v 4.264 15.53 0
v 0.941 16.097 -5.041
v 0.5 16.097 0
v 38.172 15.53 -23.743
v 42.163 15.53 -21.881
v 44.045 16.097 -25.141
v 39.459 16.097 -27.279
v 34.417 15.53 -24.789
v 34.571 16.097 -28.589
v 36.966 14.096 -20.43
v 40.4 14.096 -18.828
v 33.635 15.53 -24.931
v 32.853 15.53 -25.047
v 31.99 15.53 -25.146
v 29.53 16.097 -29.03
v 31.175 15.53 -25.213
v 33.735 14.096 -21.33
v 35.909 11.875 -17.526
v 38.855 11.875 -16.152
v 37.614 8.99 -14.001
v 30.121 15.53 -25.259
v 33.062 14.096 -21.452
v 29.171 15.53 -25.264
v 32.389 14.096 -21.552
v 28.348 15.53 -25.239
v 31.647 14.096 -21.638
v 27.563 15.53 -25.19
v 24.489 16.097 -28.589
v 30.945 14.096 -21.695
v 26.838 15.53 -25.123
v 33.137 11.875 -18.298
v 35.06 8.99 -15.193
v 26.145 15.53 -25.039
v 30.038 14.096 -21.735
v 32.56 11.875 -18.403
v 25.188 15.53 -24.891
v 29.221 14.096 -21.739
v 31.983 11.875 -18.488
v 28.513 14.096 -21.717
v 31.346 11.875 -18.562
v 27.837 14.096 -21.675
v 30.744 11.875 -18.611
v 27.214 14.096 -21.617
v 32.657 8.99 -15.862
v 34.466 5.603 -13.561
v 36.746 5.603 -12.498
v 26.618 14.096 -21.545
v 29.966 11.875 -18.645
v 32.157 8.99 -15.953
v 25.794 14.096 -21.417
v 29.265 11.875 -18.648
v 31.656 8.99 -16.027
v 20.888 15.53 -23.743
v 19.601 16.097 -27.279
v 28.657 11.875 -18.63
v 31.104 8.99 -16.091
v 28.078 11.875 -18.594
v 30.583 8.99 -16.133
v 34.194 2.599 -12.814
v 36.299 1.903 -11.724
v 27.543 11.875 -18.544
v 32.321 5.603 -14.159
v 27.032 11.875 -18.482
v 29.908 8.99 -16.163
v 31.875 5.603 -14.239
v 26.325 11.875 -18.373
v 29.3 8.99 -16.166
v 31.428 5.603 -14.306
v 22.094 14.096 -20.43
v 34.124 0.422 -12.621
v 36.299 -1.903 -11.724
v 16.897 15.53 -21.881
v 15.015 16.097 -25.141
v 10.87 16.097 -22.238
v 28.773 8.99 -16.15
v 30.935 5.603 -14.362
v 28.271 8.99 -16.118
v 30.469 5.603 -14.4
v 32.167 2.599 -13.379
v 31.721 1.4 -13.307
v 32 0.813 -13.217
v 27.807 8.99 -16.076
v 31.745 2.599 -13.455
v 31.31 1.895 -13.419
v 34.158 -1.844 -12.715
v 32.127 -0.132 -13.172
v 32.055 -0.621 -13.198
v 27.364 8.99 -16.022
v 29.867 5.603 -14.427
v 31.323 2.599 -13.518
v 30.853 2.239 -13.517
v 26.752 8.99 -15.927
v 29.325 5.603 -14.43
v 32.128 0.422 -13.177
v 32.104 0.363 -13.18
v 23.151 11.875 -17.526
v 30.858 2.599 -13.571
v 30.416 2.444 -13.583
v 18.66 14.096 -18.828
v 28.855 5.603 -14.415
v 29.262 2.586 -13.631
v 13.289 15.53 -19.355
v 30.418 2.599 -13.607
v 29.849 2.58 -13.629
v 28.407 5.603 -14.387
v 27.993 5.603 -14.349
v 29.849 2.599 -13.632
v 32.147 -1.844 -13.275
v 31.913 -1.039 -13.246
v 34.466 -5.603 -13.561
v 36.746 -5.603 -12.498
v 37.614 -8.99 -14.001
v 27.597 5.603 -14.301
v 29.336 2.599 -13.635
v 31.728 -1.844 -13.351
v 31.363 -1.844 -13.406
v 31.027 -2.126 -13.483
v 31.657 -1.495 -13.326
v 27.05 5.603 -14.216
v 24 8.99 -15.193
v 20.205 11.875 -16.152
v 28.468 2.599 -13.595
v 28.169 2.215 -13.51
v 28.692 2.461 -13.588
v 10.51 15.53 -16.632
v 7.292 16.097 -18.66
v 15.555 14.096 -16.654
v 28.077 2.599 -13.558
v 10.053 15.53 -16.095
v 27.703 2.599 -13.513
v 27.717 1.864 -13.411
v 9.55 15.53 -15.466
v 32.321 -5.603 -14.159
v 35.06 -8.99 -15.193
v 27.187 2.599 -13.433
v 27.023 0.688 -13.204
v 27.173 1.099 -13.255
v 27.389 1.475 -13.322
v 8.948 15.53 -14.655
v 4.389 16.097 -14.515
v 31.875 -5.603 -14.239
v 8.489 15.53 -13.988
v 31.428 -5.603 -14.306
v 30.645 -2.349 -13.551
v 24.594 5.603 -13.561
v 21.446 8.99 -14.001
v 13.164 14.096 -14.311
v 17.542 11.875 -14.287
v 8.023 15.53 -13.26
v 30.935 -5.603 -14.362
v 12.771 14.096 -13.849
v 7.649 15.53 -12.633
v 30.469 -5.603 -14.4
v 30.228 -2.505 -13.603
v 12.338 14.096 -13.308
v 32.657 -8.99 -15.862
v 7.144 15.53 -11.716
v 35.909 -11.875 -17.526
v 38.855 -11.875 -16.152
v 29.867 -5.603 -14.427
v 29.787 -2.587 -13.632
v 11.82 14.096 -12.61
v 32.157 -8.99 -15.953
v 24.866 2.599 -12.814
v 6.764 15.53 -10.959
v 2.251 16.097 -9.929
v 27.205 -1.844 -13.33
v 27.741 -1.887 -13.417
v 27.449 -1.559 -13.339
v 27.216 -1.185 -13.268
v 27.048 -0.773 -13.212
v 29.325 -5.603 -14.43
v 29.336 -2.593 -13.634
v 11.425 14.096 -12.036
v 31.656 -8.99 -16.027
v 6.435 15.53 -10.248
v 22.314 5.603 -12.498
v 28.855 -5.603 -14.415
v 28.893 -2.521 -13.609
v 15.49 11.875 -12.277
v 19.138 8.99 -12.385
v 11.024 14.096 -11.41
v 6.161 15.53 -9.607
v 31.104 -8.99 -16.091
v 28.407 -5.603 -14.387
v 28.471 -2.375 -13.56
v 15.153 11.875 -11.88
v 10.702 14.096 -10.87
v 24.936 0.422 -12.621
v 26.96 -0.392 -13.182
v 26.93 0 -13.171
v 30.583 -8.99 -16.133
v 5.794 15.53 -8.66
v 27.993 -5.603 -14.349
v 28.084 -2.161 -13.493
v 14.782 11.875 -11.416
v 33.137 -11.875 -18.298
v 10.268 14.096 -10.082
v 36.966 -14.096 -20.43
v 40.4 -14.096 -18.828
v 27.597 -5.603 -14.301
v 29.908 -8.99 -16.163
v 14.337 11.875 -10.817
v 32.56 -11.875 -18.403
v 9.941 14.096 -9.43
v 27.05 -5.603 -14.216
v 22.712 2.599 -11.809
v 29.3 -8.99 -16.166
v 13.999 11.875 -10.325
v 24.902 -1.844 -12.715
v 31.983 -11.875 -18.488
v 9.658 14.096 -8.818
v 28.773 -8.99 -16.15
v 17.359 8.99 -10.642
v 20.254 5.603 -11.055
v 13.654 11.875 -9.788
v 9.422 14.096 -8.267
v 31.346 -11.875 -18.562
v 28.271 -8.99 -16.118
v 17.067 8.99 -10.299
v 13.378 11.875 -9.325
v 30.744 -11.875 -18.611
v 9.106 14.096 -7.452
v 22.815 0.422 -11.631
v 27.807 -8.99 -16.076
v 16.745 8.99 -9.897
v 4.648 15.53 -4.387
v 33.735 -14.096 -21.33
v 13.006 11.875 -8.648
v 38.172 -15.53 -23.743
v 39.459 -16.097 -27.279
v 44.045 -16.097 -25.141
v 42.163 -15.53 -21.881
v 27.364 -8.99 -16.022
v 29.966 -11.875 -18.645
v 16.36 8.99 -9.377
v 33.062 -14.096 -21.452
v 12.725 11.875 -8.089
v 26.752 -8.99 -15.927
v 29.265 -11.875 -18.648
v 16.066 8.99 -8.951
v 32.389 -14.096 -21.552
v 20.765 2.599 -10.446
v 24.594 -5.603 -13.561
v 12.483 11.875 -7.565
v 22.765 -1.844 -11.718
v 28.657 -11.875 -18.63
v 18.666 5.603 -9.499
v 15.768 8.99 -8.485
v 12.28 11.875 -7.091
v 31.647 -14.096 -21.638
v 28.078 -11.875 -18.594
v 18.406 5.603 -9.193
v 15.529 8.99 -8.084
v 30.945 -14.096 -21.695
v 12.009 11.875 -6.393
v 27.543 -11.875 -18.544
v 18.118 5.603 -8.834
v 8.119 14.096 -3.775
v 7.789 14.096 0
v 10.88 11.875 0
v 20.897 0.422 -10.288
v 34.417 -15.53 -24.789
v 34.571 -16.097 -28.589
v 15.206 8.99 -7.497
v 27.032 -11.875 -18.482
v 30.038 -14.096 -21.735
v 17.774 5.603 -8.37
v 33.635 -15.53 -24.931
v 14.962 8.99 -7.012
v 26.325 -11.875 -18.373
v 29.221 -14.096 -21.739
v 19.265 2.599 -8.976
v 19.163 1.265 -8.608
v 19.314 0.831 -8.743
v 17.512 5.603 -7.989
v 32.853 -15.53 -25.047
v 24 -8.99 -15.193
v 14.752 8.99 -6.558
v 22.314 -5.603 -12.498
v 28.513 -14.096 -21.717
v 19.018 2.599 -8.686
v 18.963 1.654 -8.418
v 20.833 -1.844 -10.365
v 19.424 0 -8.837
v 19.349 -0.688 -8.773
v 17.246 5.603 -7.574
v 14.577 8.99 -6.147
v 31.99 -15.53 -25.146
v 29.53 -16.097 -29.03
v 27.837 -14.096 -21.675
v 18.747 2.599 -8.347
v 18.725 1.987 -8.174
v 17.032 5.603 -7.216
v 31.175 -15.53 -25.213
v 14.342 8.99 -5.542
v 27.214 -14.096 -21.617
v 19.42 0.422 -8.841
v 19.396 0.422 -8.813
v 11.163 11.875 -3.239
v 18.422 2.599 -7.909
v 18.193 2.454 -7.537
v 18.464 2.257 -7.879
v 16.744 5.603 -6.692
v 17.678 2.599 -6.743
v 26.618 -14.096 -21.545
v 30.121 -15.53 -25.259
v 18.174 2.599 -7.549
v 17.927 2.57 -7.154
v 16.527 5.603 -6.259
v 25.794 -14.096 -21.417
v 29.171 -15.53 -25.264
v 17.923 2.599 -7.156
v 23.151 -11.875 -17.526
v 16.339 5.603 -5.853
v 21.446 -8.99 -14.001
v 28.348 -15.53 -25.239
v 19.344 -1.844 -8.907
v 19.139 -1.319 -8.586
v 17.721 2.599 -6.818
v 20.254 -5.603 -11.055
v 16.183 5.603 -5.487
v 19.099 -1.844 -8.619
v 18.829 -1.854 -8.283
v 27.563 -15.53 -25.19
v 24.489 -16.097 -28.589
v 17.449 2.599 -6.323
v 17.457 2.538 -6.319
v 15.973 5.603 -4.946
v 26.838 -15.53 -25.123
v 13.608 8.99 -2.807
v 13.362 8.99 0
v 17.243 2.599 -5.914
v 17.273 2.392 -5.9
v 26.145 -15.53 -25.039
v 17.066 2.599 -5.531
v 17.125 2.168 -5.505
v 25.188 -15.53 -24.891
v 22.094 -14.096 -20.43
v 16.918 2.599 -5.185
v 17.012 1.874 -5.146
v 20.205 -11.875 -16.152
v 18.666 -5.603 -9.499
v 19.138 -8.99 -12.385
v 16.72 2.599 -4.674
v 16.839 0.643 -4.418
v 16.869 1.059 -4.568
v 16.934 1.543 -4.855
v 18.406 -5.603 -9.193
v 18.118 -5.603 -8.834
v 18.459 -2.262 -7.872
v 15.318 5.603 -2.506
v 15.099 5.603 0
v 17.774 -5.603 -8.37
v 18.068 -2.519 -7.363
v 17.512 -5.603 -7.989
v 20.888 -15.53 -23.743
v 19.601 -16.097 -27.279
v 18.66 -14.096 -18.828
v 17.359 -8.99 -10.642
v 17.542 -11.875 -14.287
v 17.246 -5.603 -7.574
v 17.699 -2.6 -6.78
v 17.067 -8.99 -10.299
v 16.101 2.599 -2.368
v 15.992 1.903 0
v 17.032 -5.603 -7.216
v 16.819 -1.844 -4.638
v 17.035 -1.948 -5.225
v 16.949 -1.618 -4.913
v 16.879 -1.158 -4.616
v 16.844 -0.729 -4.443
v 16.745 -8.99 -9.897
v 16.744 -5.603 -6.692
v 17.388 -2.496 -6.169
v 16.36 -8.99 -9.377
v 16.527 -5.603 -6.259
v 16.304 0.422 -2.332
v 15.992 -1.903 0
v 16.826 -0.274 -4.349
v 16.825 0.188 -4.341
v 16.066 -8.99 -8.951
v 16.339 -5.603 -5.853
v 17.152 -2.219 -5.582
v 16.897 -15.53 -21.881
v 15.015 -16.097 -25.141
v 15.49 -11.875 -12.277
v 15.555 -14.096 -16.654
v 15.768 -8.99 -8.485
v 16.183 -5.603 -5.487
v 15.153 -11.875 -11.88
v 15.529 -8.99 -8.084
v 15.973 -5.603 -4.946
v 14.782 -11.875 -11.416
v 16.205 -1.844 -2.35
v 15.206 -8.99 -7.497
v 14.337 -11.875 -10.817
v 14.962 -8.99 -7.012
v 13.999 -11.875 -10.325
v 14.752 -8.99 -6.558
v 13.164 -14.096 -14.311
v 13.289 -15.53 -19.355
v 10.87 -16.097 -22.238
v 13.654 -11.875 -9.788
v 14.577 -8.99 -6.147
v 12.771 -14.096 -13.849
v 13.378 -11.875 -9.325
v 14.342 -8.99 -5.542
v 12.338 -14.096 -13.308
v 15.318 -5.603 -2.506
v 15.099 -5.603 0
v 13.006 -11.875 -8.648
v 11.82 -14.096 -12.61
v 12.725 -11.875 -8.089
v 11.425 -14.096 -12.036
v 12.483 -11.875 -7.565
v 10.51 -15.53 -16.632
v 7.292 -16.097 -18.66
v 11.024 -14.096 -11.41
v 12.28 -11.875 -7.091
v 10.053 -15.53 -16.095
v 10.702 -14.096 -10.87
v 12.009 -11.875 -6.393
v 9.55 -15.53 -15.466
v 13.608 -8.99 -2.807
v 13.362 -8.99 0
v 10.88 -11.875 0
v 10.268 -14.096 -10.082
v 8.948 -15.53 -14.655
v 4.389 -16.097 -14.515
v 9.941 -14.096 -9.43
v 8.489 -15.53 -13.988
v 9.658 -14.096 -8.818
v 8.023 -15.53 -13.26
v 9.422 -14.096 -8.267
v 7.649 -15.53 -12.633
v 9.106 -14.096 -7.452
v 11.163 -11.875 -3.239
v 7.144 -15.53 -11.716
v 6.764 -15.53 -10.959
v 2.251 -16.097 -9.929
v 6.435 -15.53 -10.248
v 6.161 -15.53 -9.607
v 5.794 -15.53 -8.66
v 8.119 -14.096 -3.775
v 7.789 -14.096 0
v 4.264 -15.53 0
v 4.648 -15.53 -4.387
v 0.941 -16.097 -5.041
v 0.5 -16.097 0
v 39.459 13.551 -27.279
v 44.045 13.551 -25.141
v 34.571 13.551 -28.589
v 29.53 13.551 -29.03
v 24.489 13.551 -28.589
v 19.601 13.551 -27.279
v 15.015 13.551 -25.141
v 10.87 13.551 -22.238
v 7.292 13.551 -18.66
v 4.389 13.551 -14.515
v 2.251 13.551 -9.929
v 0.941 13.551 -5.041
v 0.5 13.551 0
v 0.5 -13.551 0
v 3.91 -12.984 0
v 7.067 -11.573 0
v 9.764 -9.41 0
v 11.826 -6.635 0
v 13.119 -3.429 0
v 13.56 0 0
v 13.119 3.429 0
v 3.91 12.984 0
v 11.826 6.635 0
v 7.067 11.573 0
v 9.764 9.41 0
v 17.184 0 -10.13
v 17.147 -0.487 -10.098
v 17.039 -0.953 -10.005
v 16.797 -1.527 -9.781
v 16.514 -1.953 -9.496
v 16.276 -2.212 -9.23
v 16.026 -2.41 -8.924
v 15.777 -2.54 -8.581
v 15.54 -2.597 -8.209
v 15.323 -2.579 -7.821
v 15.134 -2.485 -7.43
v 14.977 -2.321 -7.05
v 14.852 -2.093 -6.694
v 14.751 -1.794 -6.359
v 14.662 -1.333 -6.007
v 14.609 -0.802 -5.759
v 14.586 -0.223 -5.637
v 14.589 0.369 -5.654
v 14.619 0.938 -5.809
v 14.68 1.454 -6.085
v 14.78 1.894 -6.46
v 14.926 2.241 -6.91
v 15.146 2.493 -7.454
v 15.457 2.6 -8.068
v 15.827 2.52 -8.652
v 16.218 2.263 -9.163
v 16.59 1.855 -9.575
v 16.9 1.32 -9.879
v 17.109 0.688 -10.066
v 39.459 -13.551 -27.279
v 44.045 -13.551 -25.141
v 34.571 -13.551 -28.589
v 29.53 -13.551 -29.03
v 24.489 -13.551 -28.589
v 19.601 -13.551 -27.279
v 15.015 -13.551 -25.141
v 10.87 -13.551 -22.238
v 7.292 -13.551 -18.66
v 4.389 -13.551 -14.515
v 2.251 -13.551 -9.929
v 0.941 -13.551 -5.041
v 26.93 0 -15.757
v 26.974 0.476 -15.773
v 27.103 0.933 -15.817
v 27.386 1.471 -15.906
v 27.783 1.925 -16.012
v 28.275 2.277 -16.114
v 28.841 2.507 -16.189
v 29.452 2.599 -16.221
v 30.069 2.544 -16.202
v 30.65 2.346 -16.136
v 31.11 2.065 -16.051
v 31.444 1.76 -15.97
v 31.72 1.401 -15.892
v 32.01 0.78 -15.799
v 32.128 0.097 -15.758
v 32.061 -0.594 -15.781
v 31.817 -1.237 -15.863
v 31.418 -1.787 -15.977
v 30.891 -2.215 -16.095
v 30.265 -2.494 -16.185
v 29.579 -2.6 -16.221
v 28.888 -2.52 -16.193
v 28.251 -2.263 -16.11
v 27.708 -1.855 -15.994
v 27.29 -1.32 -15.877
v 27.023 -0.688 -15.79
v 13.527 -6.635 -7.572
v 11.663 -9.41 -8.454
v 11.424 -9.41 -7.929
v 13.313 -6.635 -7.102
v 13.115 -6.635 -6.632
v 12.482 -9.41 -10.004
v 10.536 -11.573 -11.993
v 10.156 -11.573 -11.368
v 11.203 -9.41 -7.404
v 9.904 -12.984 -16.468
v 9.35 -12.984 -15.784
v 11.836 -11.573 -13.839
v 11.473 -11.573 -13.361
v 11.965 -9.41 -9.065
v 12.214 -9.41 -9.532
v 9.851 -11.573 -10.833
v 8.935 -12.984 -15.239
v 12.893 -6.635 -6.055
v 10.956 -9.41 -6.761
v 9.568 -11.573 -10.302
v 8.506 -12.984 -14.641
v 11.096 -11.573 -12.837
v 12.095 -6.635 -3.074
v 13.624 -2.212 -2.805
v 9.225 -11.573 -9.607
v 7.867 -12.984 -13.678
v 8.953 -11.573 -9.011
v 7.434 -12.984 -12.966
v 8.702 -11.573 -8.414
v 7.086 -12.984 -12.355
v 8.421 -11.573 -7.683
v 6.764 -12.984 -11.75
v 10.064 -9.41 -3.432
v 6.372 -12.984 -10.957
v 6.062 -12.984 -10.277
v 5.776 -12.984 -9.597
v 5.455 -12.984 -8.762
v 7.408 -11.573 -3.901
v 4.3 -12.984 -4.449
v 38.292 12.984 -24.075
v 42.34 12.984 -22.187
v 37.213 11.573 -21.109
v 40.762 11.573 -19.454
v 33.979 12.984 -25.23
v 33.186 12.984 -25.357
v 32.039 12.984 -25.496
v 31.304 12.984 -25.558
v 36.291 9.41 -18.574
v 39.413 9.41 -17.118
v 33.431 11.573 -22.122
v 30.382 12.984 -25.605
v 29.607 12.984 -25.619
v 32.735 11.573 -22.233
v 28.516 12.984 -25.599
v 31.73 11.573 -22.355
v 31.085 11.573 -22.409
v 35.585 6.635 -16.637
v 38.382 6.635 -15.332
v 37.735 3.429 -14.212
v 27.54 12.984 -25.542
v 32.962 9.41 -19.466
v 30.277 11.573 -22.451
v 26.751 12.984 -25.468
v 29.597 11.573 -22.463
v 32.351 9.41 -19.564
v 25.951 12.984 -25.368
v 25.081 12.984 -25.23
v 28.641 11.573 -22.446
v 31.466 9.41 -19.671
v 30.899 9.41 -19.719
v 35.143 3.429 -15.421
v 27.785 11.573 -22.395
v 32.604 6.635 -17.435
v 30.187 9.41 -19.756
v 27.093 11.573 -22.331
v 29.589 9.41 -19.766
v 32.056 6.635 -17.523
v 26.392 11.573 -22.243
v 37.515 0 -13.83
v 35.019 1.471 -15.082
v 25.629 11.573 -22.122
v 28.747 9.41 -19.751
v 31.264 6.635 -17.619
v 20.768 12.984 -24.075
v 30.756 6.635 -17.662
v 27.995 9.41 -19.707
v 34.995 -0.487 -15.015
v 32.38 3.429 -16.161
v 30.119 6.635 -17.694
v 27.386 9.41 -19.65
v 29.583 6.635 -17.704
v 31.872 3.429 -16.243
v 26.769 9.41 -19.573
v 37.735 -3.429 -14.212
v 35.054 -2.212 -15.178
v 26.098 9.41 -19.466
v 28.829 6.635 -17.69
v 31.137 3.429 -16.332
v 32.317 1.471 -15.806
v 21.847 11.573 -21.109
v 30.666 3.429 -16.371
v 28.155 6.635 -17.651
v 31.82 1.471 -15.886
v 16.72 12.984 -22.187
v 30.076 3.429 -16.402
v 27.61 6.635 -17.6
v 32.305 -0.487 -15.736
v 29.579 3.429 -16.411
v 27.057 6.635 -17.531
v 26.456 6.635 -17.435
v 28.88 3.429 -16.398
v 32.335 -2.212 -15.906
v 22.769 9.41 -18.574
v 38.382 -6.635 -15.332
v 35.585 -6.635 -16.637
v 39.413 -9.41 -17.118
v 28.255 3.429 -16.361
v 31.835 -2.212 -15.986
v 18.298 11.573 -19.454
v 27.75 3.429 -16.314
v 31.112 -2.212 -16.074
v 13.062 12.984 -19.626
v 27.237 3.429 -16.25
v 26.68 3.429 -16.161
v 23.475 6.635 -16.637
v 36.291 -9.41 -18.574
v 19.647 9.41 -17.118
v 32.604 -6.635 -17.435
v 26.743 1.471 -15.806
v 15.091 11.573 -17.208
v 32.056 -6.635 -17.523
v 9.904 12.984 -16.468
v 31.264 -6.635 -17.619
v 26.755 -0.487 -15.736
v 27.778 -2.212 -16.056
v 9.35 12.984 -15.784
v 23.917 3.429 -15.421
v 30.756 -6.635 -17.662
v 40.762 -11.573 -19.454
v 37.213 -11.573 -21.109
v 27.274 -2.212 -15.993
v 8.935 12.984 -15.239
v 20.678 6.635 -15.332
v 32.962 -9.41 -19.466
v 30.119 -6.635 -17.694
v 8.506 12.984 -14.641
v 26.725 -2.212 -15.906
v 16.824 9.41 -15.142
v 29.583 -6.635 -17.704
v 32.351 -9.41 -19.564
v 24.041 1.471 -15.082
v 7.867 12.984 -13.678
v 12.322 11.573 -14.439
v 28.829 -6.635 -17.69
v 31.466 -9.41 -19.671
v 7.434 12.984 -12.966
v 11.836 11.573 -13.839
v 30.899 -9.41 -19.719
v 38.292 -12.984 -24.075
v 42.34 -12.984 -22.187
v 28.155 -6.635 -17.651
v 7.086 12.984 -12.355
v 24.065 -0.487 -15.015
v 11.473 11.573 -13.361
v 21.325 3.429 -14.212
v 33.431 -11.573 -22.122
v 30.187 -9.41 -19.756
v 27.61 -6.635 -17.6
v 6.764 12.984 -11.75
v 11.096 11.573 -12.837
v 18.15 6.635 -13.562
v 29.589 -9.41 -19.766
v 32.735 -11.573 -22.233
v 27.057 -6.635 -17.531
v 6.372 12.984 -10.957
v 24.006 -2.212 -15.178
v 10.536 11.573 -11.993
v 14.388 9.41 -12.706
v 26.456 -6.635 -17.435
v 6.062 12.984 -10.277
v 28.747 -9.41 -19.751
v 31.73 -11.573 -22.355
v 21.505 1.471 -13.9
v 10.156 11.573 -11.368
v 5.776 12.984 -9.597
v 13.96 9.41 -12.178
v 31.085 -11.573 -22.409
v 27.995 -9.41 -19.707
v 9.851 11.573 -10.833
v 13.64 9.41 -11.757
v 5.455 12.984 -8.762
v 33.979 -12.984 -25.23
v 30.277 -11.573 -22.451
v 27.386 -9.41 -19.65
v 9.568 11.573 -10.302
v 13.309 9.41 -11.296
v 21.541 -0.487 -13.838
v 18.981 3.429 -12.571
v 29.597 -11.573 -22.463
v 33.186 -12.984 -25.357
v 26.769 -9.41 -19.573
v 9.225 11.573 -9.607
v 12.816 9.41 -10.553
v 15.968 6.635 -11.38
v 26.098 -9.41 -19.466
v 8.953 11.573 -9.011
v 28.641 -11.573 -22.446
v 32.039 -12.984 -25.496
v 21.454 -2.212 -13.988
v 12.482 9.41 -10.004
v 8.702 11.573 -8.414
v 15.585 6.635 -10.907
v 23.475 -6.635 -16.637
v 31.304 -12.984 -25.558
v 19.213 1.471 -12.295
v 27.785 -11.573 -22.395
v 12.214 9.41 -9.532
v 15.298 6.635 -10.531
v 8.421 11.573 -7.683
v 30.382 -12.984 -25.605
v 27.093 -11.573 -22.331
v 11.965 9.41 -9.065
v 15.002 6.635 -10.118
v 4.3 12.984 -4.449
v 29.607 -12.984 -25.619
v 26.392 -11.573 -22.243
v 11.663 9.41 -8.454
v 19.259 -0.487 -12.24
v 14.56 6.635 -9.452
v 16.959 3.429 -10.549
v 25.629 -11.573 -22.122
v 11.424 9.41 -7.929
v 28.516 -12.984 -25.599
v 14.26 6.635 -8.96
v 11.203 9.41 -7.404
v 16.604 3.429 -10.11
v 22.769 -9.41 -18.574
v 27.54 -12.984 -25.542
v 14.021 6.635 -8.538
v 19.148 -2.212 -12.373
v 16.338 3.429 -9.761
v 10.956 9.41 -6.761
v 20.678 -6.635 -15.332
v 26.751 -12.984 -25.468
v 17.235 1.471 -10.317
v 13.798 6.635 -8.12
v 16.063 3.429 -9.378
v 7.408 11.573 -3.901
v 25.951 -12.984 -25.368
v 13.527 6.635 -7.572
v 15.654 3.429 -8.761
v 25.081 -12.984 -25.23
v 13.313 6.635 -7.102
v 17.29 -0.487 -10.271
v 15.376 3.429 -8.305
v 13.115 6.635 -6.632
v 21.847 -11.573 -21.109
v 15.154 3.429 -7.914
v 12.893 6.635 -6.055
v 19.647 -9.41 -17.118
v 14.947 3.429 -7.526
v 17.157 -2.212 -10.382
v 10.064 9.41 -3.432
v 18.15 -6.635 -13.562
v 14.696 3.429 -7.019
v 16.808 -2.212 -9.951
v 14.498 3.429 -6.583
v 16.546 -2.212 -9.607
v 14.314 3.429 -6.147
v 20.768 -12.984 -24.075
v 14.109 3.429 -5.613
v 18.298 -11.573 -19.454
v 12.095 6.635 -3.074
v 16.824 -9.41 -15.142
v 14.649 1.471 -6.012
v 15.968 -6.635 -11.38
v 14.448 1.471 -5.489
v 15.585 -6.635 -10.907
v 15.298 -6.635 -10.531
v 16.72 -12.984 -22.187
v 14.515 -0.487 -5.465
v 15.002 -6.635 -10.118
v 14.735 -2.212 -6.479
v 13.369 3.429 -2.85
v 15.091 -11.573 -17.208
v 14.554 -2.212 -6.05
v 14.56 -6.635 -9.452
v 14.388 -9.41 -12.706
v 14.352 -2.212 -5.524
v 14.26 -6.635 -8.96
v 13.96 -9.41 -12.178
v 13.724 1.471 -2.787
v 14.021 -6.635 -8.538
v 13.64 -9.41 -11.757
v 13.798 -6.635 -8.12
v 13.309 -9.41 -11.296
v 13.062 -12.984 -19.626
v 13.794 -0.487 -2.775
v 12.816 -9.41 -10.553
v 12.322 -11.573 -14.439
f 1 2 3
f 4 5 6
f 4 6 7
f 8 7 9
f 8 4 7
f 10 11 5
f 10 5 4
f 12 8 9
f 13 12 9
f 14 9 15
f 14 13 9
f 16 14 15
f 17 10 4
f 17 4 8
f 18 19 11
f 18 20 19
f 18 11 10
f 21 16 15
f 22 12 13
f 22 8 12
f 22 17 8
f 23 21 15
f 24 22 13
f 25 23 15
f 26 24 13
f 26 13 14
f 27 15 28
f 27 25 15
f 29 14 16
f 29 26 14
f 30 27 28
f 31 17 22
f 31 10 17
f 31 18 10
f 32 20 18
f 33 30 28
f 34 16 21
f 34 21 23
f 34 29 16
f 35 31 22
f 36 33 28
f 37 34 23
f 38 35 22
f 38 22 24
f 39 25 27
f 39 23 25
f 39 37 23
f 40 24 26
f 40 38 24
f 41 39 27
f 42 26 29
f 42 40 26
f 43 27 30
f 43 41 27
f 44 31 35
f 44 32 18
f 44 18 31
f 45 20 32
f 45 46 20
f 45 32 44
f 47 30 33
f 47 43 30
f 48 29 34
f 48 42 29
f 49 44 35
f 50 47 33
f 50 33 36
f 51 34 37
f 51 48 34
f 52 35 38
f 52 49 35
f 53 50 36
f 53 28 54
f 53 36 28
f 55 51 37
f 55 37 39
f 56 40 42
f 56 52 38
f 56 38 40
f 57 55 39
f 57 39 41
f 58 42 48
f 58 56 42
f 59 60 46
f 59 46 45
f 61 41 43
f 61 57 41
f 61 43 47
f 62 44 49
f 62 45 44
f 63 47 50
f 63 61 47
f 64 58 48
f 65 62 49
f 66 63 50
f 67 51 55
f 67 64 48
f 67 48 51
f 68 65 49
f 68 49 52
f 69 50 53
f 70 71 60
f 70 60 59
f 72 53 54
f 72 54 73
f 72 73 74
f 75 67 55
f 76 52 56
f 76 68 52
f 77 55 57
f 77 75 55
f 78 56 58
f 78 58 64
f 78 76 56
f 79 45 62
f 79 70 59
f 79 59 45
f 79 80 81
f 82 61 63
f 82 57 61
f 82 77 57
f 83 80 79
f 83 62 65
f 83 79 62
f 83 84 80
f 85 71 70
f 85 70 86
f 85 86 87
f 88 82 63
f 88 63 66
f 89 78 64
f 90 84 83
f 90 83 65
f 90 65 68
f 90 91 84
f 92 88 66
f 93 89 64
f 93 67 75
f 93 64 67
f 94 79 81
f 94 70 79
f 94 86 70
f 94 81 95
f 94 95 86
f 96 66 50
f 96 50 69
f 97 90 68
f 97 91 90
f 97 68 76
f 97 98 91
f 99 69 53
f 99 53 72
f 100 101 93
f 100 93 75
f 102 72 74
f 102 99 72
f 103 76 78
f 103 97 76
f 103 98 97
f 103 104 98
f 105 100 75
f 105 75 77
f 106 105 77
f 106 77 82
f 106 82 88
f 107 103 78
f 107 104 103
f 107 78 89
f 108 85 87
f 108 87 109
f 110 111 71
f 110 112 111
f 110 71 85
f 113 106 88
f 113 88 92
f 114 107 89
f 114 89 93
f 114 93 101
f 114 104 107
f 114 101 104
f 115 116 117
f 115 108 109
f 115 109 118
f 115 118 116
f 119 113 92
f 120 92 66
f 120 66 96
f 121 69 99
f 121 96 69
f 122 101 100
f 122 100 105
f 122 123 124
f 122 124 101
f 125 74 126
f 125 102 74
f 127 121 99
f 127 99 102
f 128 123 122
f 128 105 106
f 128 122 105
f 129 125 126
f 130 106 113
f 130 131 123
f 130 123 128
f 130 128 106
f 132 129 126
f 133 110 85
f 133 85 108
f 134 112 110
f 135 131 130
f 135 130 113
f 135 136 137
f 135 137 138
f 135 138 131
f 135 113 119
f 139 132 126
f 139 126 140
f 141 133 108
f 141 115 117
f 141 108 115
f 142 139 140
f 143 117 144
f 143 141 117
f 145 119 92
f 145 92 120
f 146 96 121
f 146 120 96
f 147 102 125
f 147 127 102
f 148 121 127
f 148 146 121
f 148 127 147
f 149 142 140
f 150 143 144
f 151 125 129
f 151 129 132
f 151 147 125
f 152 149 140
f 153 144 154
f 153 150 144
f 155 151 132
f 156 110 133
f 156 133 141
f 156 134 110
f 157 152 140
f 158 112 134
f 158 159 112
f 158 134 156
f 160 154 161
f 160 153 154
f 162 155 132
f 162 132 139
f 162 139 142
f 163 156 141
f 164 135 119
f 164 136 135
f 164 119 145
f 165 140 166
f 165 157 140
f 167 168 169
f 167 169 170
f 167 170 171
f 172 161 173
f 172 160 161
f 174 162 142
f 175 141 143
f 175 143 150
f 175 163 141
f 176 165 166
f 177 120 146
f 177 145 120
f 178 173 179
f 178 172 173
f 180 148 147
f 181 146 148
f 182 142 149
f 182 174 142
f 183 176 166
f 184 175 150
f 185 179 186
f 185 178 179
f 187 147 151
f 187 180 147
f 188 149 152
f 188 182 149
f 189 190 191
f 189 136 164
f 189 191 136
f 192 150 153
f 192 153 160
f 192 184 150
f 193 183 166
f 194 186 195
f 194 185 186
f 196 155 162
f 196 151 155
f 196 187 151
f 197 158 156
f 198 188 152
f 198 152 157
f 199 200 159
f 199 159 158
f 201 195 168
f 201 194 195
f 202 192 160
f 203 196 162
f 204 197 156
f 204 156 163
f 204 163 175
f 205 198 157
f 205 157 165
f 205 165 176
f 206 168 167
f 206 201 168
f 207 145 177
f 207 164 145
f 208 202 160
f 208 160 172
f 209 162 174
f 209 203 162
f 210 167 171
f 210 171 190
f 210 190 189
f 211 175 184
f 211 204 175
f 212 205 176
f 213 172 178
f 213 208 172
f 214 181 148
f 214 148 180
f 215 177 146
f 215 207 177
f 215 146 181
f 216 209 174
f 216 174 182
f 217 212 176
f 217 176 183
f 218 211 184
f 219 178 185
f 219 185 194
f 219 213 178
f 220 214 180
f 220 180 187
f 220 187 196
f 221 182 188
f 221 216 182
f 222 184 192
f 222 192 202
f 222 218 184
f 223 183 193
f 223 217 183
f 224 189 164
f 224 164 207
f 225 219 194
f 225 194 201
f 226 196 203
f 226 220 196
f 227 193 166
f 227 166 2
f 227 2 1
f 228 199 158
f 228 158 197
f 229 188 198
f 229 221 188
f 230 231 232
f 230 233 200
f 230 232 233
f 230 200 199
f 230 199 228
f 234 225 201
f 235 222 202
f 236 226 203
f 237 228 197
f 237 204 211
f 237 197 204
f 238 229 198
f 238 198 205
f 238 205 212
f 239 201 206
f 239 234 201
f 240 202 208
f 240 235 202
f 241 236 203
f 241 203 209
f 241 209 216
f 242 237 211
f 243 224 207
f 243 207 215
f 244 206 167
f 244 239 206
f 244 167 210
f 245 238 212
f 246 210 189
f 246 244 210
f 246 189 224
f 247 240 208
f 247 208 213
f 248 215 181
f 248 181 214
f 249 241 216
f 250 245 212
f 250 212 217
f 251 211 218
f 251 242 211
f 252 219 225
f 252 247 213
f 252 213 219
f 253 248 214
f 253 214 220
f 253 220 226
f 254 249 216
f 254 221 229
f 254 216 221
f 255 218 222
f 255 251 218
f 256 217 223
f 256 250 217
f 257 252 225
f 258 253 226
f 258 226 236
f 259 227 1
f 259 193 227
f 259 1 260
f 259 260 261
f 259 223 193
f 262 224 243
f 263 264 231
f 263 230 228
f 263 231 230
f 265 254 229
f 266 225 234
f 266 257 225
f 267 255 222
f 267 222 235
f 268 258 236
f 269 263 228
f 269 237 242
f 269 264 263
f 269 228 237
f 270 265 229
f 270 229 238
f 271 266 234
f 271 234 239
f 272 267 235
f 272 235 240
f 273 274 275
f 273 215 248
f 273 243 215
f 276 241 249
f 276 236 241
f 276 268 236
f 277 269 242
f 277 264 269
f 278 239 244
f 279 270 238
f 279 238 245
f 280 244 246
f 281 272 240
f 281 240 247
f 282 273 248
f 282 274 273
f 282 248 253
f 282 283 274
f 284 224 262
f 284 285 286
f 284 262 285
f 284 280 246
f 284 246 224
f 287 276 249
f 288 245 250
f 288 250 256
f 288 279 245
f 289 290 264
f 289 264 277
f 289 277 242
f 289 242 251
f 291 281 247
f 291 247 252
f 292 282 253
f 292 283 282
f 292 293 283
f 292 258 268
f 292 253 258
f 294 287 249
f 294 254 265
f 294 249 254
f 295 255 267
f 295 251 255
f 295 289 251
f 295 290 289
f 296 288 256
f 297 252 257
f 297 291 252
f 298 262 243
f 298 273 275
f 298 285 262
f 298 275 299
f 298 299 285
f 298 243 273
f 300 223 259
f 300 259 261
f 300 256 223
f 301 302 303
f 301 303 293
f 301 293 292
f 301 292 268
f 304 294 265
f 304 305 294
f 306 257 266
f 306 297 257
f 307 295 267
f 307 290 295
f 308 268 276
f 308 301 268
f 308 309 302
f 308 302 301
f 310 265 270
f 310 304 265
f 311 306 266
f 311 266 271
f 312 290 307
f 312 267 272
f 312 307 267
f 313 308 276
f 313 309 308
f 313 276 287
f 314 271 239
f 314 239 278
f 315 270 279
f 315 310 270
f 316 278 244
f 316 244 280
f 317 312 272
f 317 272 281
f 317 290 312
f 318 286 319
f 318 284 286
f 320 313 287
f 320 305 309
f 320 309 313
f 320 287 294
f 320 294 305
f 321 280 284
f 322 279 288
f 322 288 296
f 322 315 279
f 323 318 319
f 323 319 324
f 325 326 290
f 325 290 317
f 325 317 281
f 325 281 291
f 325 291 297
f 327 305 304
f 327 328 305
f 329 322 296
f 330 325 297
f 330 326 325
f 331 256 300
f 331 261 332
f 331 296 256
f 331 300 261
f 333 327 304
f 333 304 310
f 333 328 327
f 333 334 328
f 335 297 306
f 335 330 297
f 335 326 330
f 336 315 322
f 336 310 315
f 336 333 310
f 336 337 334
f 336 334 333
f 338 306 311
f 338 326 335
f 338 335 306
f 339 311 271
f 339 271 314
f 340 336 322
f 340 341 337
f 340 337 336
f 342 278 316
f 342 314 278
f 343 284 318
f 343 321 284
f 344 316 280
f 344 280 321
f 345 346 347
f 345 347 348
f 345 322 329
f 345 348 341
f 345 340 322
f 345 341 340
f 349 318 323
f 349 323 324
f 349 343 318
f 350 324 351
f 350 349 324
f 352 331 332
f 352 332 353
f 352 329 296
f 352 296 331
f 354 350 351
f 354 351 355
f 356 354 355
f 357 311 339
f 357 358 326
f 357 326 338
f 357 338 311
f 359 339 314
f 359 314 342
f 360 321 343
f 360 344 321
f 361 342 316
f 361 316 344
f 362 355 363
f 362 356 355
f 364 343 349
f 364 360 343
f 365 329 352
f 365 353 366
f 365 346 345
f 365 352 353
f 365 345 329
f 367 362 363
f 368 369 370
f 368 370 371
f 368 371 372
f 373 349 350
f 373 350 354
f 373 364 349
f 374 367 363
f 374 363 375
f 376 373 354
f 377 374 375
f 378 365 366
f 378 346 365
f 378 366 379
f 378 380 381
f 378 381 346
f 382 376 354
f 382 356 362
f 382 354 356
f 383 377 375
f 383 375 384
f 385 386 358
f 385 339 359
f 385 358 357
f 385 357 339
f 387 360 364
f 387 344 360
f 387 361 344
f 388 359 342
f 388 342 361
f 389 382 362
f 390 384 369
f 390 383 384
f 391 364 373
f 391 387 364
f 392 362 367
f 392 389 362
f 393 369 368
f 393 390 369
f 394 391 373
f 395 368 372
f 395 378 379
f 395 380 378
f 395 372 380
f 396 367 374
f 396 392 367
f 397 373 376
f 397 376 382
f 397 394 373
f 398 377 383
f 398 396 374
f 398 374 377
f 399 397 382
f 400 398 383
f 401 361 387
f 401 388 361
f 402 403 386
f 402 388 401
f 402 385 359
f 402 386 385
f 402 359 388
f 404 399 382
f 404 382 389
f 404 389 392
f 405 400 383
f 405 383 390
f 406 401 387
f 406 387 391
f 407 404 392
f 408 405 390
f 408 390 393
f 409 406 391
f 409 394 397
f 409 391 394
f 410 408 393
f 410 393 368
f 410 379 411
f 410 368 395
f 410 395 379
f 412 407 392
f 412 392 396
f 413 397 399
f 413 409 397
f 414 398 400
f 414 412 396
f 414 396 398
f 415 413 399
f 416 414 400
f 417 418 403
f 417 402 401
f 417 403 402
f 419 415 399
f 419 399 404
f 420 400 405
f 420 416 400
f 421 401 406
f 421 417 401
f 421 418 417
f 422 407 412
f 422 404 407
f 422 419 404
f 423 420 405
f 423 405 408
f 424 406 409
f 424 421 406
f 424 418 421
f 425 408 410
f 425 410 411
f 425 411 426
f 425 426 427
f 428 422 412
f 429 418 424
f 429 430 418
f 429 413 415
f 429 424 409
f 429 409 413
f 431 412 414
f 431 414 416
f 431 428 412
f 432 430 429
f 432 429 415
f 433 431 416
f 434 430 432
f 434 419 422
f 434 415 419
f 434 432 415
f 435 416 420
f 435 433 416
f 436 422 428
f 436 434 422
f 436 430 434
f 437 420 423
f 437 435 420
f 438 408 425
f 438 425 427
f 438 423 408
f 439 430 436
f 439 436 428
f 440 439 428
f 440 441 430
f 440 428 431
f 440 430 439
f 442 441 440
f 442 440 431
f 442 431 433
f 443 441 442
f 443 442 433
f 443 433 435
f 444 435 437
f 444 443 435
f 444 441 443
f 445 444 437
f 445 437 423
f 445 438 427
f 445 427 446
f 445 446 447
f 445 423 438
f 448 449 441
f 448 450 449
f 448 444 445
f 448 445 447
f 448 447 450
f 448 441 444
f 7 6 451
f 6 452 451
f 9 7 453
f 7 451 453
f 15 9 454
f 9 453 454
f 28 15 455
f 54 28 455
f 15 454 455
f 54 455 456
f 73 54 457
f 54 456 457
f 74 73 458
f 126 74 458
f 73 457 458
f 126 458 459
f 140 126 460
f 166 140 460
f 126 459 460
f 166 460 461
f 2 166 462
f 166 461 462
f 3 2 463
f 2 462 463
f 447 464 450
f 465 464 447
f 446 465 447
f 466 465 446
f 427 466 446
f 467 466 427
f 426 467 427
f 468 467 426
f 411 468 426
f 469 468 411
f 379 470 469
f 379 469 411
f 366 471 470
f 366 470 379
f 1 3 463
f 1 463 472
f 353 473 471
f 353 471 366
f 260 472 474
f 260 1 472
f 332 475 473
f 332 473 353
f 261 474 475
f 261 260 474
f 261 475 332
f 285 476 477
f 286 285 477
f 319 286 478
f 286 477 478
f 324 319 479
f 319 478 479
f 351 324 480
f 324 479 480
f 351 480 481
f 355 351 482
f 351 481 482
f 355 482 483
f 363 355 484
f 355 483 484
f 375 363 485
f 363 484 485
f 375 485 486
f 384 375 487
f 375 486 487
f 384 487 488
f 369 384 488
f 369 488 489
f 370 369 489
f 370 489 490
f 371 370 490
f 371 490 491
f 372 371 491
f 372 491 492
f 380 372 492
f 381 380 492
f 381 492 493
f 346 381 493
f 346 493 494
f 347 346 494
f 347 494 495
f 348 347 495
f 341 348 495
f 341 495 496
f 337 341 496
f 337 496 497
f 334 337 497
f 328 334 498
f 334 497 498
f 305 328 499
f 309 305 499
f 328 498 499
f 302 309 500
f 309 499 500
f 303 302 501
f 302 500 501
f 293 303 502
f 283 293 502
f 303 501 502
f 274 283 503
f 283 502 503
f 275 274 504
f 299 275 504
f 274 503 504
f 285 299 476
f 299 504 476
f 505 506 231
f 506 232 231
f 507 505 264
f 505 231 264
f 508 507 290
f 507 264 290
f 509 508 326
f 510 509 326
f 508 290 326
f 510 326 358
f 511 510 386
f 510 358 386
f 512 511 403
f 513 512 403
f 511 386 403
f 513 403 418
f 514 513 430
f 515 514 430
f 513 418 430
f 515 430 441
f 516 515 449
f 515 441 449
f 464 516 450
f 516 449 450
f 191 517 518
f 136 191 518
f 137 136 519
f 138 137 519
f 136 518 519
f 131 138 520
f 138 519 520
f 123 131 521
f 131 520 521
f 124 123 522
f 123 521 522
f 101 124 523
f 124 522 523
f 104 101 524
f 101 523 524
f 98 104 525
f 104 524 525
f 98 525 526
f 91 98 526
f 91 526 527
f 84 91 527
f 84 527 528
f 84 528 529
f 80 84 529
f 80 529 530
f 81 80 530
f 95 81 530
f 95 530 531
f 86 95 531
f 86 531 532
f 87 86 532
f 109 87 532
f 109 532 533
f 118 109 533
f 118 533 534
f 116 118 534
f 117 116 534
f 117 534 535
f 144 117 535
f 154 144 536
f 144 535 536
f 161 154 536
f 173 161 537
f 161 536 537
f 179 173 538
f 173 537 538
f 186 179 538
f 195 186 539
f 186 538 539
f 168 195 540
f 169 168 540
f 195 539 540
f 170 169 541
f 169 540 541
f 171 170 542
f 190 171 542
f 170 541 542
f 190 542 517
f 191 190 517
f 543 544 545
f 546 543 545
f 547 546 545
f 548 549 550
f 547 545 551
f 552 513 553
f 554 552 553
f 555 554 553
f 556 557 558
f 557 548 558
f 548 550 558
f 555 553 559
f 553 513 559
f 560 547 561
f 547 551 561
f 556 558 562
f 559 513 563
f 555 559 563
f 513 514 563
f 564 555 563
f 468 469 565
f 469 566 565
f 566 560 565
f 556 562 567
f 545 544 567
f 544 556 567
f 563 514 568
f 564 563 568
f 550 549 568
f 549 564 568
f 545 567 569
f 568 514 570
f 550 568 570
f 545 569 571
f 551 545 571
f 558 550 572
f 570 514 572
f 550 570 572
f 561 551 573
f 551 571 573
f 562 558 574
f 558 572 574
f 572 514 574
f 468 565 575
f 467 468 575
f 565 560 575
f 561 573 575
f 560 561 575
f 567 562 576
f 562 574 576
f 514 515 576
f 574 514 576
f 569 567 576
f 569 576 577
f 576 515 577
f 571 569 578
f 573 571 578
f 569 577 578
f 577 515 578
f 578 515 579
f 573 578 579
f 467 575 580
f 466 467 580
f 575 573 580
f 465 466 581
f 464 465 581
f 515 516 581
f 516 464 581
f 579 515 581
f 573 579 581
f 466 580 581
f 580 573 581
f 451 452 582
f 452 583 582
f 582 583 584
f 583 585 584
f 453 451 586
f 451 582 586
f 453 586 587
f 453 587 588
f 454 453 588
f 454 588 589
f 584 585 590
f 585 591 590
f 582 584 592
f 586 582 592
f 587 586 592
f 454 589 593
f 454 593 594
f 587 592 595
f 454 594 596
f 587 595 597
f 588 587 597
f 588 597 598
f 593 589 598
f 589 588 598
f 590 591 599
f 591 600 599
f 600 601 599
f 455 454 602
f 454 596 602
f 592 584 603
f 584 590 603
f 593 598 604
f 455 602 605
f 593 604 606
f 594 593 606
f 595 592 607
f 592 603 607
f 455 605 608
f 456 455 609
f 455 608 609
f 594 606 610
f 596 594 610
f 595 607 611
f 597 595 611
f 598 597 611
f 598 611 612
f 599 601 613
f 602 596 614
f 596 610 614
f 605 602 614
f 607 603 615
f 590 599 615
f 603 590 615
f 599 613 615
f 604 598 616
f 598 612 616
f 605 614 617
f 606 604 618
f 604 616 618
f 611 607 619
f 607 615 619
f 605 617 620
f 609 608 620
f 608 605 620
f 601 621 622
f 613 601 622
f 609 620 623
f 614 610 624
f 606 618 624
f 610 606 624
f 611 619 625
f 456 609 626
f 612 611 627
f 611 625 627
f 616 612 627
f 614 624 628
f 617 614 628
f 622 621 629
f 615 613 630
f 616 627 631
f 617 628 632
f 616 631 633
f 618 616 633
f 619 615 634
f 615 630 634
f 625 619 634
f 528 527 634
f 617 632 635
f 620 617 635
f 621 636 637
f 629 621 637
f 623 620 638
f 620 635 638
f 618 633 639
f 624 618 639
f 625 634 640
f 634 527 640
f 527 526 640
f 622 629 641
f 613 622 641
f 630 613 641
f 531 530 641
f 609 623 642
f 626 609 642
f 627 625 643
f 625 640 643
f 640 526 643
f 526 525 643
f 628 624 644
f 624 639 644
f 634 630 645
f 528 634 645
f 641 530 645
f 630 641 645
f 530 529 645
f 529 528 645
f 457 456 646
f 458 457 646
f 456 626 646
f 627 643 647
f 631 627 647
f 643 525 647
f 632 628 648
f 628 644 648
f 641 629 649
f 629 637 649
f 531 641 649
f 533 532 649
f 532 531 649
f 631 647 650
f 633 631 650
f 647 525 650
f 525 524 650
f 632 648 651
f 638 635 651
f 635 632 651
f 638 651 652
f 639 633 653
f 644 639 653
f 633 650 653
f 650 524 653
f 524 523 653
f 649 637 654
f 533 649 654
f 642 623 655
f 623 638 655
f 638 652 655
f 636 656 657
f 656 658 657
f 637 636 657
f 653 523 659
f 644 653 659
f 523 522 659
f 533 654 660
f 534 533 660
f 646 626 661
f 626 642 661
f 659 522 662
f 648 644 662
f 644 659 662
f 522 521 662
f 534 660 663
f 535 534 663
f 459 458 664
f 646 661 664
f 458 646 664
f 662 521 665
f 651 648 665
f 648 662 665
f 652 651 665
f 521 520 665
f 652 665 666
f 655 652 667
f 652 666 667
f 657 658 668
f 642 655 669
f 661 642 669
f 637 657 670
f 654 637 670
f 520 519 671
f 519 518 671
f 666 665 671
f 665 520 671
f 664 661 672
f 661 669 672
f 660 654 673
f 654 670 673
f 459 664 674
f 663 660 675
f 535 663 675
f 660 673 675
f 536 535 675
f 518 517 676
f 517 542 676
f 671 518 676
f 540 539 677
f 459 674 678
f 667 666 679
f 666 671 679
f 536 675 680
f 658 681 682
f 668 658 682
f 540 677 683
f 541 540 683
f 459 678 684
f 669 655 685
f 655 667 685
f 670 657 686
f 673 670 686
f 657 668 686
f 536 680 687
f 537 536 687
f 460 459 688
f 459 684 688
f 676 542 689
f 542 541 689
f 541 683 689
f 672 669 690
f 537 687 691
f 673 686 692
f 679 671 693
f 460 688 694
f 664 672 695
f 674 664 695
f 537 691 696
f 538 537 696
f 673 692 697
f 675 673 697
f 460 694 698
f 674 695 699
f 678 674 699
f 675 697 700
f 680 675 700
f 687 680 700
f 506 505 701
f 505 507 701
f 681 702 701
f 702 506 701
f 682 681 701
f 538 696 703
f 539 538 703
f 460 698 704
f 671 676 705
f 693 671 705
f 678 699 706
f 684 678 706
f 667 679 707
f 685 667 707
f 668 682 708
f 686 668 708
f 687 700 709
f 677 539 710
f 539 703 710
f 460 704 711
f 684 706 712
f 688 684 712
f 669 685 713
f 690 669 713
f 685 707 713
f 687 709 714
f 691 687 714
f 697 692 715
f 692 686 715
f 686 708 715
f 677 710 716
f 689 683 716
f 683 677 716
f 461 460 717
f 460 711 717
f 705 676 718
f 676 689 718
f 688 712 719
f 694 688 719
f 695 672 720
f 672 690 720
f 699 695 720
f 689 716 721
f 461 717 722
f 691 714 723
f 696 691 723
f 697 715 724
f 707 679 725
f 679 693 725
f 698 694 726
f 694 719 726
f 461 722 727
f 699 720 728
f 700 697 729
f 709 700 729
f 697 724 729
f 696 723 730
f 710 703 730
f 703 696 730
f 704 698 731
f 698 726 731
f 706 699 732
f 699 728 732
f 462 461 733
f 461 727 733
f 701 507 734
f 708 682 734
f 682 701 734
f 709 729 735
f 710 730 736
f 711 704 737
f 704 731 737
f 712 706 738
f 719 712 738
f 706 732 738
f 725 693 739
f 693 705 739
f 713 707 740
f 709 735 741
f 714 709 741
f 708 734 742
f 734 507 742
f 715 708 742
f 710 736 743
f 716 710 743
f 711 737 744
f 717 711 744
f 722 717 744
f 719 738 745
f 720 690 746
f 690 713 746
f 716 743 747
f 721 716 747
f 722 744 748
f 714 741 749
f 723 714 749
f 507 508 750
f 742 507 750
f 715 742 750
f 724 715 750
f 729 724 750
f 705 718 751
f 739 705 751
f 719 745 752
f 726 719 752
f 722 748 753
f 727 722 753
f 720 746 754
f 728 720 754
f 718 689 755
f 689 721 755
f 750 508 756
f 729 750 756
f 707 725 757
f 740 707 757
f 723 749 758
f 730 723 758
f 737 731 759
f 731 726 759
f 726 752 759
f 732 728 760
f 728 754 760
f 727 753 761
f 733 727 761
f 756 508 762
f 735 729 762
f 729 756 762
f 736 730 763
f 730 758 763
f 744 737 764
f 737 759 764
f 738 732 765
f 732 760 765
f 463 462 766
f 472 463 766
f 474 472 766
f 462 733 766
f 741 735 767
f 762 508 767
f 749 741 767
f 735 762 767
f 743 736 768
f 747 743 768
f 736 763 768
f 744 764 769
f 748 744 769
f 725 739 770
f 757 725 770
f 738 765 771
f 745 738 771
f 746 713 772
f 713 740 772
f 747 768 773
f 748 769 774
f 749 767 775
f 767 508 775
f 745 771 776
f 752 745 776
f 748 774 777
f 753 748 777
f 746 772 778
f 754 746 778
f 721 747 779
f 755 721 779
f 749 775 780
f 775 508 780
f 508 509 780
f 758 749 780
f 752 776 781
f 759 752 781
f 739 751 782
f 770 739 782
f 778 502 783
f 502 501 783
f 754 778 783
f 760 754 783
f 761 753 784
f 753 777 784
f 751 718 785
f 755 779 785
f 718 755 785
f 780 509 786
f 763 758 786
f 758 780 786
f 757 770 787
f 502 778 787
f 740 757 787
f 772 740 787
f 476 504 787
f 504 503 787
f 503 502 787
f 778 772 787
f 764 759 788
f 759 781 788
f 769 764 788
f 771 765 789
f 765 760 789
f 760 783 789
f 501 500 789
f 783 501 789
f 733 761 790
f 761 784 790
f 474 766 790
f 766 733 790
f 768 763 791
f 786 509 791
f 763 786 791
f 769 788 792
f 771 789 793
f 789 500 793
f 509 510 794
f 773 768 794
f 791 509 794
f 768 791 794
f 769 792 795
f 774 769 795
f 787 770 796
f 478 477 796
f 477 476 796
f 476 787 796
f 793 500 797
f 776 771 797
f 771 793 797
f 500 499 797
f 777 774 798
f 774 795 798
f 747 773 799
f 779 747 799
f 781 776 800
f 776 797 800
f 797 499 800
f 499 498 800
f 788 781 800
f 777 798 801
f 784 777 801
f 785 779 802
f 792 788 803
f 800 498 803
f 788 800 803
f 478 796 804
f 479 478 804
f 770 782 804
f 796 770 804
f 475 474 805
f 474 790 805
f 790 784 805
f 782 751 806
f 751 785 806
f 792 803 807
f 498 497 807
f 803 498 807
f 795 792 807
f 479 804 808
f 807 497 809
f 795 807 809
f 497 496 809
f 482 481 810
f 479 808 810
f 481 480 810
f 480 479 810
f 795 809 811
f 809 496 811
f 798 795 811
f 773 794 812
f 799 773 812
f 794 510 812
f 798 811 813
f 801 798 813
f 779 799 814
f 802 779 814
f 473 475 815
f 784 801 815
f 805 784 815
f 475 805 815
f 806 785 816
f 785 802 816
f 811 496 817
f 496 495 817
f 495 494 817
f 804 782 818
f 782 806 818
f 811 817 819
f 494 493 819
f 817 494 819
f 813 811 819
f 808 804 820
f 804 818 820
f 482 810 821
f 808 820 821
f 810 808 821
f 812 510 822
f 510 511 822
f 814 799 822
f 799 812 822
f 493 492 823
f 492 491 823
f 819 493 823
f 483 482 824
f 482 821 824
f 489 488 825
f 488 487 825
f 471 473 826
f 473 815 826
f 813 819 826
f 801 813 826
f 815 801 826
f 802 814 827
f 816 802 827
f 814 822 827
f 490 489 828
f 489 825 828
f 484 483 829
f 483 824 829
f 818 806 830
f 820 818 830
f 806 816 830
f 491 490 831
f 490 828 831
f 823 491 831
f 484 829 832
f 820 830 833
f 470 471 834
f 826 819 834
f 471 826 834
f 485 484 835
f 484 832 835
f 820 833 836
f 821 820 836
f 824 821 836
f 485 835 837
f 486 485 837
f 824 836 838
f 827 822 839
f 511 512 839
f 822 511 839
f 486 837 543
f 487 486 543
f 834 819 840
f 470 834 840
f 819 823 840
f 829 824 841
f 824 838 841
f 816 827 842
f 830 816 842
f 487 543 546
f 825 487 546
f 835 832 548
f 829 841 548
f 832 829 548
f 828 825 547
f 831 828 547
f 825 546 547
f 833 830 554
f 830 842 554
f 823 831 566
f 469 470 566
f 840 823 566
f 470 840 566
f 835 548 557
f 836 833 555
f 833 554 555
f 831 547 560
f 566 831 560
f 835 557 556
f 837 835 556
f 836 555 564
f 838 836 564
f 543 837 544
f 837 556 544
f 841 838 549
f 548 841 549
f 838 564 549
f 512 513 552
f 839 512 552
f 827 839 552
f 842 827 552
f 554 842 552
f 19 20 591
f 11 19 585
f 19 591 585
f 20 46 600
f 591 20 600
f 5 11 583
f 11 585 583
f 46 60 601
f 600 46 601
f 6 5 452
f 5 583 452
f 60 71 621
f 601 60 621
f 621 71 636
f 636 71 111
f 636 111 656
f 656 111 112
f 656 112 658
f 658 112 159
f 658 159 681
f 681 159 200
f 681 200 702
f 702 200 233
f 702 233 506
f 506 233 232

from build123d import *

# Parameters (mm, degrees)
F_5_0MM_DOWEL_HOLE1_D               = 5.2
F_5_0MM_DOWEL_HOLE1_DEPTH           = 5
F_5_0MM_DOWEL_HOLE1_TIP             = 1.562237609
F_5_0MM_DOWEL_HOLE1_ON_FACE_2_D     = 5.2
F_5_0MM_DOWEL_HOLE1_ON_FACE_2_DEPTH = 5
F_5_0MM_DOWEL_HOLE1_ON_FACE_2_TIP   = 1.562237609


with BuildPart() as part:
    # Sweep1: sweep along a path in Sketch2
    with BuildLine(Plane(origin=(0, 0, 0), x_dir=(1, 0, 0), z_dir=(0, 1, 0))) as sweep1_path:
        ThreePointArc((44.295, 25.573730174), (14.765, 25.573730174), (0, 0))
    # Sketch1 → Sweep1 (sweep)
    with BuildSketch(Plane.XY):
        with BuildLine():
            Line((0.5, 16.097236564), (0.5, 13.550778575))
            ThreePointArc((0.5, 13.550778575), (13.56, 0), (0.5, -13.550778575))
            Line((0.5, -13.550778575), (0.5, -16.097236564))
            ThreePointArc((0.5, -16.097236564), (16.105, 0), (0.5, 16.097236564))
        make_face()
    sweep(path=sweep1_path.line)

    # Ø5.0mm Dowel Hole1
    with Locations(Plane(origin=(29.53, 0, -13.425), x_dir=(1, 0, 0), z_dir=(0, 0, 1))):
        with Locations((0, 0)):
            Hole(F_5_0MM_DOWEL_HOLE1_D / 2, depth=F_5_0MM_DOWEL_HOLE1_DEPTH)
            with Locations((0, 0, -(F_5_0MM_DOWEL_HOLE1_DEPTH + F_5_0MM_DOWEL_HOLE1_TIP / 2))):  # 118° drill point
                Cone(0, F_5_0MM_DOWEL_HOLE1_D / 2, F_5_0MM_DOWEL_HOLE1_TIP, mode=Mode.SUBTRACT)

    # Ø5.0mm Dowel Hole1 on face 2
    with Locations(Plane(origin=(17.903608954, 0, -6.7125), x_dir=(-0.500000174844, 0, 0.866025302838), z_dir=(0.866025302838, 0, 0.500000174844))):
        with Locations((0, 0)):
            Hole(F_5_0MM_DOWEL_HOLE1_ON_FACE_2_D / 2, depth=F_5_0MM_DOWEL_HOLE1_ON_FACE_2_DEPTH)
            with Locations((0, 0, -(F_5_0MM_DOWEL_HOLE1_ON_FACE_2_DEPTH + F_5_0MM_DOWEL_HOLE1_ON_FACE_2_TIP / 2))):  # 118° drill point
                Cone(0, F_5_0MM_DOWEL_HOLE1_ON_FACE_2_D / 2, F_5_0MM_DOWEL_HOLE1_ON_FACE_2_TIP, mode=Mode.SUBTRACT)


solid = part.part
